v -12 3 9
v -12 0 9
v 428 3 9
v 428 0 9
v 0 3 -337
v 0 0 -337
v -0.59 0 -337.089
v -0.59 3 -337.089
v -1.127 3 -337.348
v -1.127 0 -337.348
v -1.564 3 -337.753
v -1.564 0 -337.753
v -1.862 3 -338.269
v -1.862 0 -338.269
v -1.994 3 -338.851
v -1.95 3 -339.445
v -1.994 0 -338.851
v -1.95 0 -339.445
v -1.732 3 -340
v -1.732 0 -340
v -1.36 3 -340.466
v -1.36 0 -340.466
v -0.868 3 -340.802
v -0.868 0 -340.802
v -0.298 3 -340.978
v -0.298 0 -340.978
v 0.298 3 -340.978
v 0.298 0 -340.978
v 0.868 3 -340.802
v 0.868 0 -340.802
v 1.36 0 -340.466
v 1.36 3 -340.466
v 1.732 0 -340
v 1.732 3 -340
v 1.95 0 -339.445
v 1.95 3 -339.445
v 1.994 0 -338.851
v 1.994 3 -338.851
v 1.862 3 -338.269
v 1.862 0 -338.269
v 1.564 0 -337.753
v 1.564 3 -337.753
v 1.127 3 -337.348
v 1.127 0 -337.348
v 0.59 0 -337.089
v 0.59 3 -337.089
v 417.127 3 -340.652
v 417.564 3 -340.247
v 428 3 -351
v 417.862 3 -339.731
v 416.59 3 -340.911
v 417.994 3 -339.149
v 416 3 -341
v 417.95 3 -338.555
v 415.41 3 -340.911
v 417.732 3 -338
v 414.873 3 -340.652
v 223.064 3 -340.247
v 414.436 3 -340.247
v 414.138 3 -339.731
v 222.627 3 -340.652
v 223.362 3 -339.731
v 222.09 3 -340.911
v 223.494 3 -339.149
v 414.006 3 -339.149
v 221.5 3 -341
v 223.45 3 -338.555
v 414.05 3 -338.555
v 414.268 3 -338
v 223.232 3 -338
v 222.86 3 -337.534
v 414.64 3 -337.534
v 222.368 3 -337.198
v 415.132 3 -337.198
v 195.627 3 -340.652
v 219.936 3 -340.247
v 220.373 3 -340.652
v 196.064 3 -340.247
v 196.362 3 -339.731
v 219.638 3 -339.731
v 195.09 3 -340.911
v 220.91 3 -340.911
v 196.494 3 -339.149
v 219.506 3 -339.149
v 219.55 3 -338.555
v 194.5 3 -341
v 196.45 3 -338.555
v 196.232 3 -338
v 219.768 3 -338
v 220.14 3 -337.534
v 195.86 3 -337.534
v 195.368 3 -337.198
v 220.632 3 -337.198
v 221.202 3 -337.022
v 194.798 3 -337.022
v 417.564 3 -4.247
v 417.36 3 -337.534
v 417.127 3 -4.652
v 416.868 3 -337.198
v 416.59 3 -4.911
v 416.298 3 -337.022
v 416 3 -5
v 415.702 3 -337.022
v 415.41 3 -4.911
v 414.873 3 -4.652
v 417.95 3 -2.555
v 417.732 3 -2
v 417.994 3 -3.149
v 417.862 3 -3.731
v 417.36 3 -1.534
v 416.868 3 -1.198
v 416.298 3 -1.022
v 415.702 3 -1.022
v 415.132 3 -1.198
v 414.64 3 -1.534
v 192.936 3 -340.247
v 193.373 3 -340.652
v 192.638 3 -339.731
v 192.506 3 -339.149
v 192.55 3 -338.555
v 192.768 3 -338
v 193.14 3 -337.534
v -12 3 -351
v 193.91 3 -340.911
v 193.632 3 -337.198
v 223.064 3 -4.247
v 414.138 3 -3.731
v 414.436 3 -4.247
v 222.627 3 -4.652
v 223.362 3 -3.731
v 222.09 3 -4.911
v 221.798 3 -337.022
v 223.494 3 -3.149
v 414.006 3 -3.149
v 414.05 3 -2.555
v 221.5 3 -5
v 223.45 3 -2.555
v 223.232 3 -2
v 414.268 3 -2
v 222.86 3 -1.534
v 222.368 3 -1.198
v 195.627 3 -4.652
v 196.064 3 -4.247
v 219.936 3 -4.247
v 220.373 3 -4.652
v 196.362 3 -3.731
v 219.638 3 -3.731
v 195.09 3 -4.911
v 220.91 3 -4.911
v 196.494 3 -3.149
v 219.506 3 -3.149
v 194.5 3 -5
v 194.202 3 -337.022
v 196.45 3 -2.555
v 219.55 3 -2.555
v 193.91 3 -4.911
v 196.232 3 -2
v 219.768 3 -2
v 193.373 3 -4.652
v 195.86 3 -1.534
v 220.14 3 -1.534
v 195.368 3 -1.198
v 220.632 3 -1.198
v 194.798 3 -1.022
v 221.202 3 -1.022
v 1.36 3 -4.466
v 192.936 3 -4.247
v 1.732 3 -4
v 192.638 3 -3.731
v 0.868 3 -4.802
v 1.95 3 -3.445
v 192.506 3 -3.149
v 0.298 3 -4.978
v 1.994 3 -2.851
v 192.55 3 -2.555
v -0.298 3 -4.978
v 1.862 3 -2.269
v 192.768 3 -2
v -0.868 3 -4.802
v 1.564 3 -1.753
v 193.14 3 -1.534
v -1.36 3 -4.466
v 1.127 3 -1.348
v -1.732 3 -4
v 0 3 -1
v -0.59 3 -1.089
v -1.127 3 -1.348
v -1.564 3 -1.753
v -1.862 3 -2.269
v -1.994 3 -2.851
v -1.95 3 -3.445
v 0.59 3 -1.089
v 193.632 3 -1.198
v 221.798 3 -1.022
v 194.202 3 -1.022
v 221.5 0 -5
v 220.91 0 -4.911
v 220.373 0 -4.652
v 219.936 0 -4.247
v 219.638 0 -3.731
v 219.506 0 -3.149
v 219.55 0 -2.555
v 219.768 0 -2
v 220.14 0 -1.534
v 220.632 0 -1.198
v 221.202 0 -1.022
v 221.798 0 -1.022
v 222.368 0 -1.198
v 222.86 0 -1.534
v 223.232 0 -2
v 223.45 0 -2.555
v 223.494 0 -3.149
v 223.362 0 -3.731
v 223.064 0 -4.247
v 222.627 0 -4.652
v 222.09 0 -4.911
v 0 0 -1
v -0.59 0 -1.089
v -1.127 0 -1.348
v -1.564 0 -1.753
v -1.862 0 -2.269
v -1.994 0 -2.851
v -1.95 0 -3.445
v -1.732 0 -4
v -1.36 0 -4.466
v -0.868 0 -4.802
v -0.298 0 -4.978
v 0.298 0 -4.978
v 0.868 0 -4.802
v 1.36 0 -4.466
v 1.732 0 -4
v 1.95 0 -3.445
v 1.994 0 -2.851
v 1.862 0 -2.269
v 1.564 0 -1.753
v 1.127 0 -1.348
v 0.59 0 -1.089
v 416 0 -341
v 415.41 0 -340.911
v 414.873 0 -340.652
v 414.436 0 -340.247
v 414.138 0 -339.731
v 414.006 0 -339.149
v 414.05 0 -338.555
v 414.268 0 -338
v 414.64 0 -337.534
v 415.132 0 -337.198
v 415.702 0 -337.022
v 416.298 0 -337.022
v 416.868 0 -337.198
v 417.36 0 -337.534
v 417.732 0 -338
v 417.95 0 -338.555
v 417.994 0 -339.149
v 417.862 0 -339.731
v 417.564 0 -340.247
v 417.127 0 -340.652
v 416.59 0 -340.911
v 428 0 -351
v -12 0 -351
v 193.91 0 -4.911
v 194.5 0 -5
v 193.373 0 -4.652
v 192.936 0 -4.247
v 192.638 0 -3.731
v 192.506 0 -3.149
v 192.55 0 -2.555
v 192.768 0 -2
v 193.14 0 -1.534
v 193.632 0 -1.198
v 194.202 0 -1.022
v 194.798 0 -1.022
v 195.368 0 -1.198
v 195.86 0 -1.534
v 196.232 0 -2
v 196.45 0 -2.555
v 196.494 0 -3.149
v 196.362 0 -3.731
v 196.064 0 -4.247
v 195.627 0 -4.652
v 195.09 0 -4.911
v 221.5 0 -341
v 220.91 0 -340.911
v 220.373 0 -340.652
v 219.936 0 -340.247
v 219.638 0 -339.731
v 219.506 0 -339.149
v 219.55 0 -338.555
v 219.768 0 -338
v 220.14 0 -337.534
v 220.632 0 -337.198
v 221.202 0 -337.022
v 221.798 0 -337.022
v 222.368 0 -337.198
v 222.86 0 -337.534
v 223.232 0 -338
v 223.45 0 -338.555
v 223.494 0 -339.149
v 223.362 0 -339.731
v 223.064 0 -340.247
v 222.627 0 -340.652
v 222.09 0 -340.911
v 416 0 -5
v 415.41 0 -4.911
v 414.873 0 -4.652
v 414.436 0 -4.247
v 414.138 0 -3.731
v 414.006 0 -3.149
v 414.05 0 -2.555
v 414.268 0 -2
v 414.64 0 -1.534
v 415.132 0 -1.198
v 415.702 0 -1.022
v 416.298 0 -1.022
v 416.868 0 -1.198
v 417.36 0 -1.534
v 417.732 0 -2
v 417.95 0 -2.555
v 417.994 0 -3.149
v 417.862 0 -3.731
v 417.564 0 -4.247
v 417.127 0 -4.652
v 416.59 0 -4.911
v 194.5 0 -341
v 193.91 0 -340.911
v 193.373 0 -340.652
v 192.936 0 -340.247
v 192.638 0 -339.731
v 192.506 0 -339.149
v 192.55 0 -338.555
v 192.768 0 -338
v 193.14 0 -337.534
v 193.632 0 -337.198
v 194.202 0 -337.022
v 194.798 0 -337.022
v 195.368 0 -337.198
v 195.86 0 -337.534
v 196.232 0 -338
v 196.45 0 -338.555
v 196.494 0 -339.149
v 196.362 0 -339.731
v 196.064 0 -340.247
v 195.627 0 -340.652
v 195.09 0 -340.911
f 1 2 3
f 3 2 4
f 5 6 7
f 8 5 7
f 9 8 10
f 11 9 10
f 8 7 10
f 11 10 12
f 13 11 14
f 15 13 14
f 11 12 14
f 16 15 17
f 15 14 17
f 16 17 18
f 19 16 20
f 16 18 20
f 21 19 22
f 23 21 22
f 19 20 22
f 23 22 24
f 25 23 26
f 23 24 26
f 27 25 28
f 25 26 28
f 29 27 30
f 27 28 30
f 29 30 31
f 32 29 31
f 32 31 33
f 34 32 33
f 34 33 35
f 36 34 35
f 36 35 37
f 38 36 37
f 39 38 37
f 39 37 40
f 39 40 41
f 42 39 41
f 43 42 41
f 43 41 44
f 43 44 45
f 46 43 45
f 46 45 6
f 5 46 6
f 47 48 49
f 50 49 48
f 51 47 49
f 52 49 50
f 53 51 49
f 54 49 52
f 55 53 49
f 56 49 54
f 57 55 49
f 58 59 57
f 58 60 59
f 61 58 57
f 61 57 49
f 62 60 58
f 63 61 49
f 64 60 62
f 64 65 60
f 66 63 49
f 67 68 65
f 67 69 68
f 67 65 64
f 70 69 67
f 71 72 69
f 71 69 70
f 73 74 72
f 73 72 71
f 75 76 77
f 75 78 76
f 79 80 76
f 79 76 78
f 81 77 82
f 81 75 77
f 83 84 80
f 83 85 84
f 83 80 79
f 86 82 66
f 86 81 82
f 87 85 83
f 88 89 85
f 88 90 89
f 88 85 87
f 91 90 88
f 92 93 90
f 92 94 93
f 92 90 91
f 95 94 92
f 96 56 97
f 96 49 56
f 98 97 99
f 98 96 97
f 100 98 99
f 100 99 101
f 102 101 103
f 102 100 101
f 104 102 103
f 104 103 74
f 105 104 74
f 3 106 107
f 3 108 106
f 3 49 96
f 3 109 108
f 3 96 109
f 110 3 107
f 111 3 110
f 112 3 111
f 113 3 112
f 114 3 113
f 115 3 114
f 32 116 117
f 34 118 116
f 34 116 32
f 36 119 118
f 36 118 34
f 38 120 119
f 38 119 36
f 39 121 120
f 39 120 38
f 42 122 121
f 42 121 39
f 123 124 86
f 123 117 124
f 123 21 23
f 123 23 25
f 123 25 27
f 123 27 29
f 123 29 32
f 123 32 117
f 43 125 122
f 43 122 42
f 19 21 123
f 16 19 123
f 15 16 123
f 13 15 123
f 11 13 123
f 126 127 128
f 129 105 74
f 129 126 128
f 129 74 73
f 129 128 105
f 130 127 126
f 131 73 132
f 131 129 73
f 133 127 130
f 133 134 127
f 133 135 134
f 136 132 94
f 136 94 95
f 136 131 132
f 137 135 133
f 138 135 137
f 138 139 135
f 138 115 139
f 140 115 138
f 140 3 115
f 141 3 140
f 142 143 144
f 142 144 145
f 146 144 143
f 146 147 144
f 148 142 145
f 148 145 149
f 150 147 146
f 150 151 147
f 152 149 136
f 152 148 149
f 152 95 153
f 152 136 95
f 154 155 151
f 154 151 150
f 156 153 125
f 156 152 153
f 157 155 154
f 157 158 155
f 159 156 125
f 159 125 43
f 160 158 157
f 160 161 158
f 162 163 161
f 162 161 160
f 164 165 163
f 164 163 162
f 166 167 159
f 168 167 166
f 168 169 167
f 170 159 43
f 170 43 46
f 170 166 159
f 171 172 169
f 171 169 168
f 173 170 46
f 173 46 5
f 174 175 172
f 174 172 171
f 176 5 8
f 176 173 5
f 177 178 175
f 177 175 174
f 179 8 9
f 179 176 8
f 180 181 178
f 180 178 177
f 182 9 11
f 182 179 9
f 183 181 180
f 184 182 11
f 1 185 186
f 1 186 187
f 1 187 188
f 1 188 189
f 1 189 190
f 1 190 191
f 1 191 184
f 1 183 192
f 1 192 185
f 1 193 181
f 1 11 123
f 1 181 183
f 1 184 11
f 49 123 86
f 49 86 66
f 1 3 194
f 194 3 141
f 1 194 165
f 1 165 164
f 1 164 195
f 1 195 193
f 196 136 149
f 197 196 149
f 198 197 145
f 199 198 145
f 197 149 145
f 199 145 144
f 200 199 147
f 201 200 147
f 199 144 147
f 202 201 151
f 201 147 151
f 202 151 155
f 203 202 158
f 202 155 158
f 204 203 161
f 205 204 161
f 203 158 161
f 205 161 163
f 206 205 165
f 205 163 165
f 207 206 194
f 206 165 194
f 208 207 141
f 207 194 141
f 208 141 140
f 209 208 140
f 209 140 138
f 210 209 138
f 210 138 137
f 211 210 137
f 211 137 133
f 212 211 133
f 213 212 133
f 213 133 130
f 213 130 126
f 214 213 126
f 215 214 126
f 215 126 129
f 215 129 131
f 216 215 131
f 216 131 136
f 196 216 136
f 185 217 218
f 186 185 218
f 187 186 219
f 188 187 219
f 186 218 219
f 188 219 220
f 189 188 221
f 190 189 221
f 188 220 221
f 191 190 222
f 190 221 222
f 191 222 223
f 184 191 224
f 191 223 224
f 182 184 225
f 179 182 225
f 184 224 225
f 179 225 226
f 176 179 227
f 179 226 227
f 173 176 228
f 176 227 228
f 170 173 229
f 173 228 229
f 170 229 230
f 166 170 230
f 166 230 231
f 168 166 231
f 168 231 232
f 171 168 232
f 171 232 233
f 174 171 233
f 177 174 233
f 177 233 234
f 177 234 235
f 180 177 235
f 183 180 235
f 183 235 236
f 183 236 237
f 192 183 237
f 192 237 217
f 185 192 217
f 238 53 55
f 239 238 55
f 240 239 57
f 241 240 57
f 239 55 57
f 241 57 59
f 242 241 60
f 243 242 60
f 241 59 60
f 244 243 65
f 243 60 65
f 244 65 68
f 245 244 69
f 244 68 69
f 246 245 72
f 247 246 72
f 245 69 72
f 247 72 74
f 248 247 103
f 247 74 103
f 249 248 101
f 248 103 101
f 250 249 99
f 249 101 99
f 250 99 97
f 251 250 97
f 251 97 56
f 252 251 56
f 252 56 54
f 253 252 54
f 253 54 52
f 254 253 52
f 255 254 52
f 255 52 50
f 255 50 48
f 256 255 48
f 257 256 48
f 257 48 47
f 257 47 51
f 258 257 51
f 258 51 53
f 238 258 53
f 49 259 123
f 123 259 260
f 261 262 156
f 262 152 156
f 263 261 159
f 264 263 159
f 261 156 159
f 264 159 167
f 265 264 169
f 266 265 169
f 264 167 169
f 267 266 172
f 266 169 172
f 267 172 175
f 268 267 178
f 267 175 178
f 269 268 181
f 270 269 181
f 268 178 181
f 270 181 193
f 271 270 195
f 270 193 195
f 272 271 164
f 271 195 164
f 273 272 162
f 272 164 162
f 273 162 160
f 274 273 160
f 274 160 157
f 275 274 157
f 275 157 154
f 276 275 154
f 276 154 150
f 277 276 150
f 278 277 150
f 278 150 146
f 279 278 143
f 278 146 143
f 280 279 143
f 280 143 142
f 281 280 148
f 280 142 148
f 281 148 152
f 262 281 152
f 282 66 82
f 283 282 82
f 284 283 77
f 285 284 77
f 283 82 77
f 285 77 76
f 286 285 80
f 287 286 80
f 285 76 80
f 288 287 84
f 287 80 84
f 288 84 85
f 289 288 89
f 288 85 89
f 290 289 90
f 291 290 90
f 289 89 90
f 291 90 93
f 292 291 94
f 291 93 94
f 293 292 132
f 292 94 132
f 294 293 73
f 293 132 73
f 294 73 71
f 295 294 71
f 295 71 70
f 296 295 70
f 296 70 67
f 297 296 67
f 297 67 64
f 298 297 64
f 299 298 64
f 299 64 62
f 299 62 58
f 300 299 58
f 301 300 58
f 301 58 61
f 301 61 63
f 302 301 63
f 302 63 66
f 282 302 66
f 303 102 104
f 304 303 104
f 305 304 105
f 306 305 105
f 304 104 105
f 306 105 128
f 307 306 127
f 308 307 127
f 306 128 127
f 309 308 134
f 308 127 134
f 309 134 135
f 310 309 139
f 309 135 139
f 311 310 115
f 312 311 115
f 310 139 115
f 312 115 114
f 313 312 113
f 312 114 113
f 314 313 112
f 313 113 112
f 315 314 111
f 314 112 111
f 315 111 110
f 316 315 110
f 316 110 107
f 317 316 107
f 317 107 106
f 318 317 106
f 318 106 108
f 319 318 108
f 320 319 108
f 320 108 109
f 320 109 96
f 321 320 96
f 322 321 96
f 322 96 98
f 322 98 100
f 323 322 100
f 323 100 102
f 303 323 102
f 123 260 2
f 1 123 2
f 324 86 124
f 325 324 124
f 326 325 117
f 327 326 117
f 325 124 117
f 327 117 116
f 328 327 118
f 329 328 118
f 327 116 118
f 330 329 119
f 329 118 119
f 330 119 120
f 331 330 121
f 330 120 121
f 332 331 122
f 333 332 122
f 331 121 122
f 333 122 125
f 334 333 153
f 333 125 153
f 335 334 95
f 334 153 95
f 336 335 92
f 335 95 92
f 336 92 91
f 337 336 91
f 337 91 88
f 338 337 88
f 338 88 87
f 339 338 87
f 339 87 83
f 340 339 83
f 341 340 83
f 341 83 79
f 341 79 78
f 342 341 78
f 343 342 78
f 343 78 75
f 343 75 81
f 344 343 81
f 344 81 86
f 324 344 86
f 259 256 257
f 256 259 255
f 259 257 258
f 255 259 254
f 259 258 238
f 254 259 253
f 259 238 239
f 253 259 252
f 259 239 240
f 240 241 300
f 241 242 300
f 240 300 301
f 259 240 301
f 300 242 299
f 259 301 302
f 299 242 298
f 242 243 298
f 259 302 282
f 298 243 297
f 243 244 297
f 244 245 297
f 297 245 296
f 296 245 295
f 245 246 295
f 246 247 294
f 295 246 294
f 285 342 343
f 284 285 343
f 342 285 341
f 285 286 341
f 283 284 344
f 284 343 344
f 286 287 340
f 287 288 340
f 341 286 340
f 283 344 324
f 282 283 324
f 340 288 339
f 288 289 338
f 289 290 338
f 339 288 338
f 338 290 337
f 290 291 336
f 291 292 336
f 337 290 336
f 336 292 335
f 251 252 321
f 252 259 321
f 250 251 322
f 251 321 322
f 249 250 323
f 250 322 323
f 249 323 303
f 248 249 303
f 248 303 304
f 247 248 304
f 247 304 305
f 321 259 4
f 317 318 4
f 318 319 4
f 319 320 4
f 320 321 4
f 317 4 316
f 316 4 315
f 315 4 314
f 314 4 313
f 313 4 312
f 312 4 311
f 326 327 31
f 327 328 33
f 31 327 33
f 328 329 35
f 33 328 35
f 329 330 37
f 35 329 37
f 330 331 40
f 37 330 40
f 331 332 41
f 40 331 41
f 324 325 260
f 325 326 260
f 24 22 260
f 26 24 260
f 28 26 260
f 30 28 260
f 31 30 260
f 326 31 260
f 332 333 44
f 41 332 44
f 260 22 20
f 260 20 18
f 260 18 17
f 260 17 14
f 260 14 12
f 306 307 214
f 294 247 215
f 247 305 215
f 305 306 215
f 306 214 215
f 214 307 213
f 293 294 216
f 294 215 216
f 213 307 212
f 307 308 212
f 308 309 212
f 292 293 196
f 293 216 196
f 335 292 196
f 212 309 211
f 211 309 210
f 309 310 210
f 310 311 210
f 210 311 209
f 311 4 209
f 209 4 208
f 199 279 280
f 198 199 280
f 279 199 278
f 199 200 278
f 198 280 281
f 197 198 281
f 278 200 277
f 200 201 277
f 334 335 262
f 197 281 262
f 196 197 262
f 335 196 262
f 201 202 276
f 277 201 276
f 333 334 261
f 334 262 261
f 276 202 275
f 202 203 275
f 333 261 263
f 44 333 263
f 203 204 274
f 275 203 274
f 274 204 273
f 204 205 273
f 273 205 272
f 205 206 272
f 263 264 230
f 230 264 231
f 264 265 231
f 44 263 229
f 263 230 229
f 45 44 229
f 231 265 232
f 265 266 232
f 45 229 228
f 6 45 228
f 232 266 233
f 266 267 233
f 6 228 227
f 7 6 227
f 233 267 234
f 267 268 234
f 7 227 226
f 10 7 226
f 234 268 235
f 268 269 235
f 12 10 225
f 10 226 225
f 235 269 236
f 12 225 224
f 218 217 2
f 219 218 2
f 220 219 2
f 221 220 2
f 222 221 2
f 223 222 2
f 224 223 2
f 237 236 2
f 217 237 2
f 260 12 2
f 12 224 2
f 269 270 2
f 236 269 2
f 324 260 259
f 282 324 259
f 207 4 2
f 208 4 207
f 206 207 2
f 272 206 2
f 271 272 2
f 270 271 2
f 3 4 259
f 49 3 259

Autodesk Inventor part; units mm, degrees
ref_plane "YZ Plane" through (0, 0, 0) normal (1, 0, 0) x (0, 1, 0)
ref_plane "XZ Plane" through (0, 0, 0) normal (0, 1, 0) x (-1, 0, 0)
ref_plane "XY Plane" through (0, 0, 0) normal (0, 0, 1) x (1, 0, 0)
sketch "Sketch1" plane through (0, 0, 0) normal (0, 1, 0) x (-1, 0, 0)
  line L0 (12, 9) -> (-428, 9)
  line L1 (-428, 9) -> (-428, -351)
  line L2 (-428, -351) -> (12, -351)
  line L3 (12, -351) -> (12, 9)
  point P0 (0, 0)
  dimension "d0" = 440
  dimension "d1" = 360
extrude "Extrusion1" add sketch "Sketch1" along normal blind 3
hole "Hole1" at (0, 3, -3) direction (0, -1, 0) diameter 4 end through all
hole "Hole2" at (0, 3, -339) direction (0, -1, 0) diameter 4 end through all
hole "Hole3" at (416, 0, -3) direction (0, 1, 0) diameter 4 end through all
hole "Hole4" at (416, 0, -339) direction (0, 1, 0) diameter 4 end through all
hole "Hole5" at (194.5, 0, -339) direction (0, 1, 0) diameter 4 end through all
hole "Hole6" at (221.5, 0, -339) direction (0, 1, 0) diameter 4 end through all
hole "Hole7" at (194.5, 0, -3) direction (0, 1, 0) diameter 4 end through all
hole "Hole8" at (221.5, 0, -3) direction (0, 1, 0) diameter 4 end through all
properties part number "FrameBase" material "Dibond"
